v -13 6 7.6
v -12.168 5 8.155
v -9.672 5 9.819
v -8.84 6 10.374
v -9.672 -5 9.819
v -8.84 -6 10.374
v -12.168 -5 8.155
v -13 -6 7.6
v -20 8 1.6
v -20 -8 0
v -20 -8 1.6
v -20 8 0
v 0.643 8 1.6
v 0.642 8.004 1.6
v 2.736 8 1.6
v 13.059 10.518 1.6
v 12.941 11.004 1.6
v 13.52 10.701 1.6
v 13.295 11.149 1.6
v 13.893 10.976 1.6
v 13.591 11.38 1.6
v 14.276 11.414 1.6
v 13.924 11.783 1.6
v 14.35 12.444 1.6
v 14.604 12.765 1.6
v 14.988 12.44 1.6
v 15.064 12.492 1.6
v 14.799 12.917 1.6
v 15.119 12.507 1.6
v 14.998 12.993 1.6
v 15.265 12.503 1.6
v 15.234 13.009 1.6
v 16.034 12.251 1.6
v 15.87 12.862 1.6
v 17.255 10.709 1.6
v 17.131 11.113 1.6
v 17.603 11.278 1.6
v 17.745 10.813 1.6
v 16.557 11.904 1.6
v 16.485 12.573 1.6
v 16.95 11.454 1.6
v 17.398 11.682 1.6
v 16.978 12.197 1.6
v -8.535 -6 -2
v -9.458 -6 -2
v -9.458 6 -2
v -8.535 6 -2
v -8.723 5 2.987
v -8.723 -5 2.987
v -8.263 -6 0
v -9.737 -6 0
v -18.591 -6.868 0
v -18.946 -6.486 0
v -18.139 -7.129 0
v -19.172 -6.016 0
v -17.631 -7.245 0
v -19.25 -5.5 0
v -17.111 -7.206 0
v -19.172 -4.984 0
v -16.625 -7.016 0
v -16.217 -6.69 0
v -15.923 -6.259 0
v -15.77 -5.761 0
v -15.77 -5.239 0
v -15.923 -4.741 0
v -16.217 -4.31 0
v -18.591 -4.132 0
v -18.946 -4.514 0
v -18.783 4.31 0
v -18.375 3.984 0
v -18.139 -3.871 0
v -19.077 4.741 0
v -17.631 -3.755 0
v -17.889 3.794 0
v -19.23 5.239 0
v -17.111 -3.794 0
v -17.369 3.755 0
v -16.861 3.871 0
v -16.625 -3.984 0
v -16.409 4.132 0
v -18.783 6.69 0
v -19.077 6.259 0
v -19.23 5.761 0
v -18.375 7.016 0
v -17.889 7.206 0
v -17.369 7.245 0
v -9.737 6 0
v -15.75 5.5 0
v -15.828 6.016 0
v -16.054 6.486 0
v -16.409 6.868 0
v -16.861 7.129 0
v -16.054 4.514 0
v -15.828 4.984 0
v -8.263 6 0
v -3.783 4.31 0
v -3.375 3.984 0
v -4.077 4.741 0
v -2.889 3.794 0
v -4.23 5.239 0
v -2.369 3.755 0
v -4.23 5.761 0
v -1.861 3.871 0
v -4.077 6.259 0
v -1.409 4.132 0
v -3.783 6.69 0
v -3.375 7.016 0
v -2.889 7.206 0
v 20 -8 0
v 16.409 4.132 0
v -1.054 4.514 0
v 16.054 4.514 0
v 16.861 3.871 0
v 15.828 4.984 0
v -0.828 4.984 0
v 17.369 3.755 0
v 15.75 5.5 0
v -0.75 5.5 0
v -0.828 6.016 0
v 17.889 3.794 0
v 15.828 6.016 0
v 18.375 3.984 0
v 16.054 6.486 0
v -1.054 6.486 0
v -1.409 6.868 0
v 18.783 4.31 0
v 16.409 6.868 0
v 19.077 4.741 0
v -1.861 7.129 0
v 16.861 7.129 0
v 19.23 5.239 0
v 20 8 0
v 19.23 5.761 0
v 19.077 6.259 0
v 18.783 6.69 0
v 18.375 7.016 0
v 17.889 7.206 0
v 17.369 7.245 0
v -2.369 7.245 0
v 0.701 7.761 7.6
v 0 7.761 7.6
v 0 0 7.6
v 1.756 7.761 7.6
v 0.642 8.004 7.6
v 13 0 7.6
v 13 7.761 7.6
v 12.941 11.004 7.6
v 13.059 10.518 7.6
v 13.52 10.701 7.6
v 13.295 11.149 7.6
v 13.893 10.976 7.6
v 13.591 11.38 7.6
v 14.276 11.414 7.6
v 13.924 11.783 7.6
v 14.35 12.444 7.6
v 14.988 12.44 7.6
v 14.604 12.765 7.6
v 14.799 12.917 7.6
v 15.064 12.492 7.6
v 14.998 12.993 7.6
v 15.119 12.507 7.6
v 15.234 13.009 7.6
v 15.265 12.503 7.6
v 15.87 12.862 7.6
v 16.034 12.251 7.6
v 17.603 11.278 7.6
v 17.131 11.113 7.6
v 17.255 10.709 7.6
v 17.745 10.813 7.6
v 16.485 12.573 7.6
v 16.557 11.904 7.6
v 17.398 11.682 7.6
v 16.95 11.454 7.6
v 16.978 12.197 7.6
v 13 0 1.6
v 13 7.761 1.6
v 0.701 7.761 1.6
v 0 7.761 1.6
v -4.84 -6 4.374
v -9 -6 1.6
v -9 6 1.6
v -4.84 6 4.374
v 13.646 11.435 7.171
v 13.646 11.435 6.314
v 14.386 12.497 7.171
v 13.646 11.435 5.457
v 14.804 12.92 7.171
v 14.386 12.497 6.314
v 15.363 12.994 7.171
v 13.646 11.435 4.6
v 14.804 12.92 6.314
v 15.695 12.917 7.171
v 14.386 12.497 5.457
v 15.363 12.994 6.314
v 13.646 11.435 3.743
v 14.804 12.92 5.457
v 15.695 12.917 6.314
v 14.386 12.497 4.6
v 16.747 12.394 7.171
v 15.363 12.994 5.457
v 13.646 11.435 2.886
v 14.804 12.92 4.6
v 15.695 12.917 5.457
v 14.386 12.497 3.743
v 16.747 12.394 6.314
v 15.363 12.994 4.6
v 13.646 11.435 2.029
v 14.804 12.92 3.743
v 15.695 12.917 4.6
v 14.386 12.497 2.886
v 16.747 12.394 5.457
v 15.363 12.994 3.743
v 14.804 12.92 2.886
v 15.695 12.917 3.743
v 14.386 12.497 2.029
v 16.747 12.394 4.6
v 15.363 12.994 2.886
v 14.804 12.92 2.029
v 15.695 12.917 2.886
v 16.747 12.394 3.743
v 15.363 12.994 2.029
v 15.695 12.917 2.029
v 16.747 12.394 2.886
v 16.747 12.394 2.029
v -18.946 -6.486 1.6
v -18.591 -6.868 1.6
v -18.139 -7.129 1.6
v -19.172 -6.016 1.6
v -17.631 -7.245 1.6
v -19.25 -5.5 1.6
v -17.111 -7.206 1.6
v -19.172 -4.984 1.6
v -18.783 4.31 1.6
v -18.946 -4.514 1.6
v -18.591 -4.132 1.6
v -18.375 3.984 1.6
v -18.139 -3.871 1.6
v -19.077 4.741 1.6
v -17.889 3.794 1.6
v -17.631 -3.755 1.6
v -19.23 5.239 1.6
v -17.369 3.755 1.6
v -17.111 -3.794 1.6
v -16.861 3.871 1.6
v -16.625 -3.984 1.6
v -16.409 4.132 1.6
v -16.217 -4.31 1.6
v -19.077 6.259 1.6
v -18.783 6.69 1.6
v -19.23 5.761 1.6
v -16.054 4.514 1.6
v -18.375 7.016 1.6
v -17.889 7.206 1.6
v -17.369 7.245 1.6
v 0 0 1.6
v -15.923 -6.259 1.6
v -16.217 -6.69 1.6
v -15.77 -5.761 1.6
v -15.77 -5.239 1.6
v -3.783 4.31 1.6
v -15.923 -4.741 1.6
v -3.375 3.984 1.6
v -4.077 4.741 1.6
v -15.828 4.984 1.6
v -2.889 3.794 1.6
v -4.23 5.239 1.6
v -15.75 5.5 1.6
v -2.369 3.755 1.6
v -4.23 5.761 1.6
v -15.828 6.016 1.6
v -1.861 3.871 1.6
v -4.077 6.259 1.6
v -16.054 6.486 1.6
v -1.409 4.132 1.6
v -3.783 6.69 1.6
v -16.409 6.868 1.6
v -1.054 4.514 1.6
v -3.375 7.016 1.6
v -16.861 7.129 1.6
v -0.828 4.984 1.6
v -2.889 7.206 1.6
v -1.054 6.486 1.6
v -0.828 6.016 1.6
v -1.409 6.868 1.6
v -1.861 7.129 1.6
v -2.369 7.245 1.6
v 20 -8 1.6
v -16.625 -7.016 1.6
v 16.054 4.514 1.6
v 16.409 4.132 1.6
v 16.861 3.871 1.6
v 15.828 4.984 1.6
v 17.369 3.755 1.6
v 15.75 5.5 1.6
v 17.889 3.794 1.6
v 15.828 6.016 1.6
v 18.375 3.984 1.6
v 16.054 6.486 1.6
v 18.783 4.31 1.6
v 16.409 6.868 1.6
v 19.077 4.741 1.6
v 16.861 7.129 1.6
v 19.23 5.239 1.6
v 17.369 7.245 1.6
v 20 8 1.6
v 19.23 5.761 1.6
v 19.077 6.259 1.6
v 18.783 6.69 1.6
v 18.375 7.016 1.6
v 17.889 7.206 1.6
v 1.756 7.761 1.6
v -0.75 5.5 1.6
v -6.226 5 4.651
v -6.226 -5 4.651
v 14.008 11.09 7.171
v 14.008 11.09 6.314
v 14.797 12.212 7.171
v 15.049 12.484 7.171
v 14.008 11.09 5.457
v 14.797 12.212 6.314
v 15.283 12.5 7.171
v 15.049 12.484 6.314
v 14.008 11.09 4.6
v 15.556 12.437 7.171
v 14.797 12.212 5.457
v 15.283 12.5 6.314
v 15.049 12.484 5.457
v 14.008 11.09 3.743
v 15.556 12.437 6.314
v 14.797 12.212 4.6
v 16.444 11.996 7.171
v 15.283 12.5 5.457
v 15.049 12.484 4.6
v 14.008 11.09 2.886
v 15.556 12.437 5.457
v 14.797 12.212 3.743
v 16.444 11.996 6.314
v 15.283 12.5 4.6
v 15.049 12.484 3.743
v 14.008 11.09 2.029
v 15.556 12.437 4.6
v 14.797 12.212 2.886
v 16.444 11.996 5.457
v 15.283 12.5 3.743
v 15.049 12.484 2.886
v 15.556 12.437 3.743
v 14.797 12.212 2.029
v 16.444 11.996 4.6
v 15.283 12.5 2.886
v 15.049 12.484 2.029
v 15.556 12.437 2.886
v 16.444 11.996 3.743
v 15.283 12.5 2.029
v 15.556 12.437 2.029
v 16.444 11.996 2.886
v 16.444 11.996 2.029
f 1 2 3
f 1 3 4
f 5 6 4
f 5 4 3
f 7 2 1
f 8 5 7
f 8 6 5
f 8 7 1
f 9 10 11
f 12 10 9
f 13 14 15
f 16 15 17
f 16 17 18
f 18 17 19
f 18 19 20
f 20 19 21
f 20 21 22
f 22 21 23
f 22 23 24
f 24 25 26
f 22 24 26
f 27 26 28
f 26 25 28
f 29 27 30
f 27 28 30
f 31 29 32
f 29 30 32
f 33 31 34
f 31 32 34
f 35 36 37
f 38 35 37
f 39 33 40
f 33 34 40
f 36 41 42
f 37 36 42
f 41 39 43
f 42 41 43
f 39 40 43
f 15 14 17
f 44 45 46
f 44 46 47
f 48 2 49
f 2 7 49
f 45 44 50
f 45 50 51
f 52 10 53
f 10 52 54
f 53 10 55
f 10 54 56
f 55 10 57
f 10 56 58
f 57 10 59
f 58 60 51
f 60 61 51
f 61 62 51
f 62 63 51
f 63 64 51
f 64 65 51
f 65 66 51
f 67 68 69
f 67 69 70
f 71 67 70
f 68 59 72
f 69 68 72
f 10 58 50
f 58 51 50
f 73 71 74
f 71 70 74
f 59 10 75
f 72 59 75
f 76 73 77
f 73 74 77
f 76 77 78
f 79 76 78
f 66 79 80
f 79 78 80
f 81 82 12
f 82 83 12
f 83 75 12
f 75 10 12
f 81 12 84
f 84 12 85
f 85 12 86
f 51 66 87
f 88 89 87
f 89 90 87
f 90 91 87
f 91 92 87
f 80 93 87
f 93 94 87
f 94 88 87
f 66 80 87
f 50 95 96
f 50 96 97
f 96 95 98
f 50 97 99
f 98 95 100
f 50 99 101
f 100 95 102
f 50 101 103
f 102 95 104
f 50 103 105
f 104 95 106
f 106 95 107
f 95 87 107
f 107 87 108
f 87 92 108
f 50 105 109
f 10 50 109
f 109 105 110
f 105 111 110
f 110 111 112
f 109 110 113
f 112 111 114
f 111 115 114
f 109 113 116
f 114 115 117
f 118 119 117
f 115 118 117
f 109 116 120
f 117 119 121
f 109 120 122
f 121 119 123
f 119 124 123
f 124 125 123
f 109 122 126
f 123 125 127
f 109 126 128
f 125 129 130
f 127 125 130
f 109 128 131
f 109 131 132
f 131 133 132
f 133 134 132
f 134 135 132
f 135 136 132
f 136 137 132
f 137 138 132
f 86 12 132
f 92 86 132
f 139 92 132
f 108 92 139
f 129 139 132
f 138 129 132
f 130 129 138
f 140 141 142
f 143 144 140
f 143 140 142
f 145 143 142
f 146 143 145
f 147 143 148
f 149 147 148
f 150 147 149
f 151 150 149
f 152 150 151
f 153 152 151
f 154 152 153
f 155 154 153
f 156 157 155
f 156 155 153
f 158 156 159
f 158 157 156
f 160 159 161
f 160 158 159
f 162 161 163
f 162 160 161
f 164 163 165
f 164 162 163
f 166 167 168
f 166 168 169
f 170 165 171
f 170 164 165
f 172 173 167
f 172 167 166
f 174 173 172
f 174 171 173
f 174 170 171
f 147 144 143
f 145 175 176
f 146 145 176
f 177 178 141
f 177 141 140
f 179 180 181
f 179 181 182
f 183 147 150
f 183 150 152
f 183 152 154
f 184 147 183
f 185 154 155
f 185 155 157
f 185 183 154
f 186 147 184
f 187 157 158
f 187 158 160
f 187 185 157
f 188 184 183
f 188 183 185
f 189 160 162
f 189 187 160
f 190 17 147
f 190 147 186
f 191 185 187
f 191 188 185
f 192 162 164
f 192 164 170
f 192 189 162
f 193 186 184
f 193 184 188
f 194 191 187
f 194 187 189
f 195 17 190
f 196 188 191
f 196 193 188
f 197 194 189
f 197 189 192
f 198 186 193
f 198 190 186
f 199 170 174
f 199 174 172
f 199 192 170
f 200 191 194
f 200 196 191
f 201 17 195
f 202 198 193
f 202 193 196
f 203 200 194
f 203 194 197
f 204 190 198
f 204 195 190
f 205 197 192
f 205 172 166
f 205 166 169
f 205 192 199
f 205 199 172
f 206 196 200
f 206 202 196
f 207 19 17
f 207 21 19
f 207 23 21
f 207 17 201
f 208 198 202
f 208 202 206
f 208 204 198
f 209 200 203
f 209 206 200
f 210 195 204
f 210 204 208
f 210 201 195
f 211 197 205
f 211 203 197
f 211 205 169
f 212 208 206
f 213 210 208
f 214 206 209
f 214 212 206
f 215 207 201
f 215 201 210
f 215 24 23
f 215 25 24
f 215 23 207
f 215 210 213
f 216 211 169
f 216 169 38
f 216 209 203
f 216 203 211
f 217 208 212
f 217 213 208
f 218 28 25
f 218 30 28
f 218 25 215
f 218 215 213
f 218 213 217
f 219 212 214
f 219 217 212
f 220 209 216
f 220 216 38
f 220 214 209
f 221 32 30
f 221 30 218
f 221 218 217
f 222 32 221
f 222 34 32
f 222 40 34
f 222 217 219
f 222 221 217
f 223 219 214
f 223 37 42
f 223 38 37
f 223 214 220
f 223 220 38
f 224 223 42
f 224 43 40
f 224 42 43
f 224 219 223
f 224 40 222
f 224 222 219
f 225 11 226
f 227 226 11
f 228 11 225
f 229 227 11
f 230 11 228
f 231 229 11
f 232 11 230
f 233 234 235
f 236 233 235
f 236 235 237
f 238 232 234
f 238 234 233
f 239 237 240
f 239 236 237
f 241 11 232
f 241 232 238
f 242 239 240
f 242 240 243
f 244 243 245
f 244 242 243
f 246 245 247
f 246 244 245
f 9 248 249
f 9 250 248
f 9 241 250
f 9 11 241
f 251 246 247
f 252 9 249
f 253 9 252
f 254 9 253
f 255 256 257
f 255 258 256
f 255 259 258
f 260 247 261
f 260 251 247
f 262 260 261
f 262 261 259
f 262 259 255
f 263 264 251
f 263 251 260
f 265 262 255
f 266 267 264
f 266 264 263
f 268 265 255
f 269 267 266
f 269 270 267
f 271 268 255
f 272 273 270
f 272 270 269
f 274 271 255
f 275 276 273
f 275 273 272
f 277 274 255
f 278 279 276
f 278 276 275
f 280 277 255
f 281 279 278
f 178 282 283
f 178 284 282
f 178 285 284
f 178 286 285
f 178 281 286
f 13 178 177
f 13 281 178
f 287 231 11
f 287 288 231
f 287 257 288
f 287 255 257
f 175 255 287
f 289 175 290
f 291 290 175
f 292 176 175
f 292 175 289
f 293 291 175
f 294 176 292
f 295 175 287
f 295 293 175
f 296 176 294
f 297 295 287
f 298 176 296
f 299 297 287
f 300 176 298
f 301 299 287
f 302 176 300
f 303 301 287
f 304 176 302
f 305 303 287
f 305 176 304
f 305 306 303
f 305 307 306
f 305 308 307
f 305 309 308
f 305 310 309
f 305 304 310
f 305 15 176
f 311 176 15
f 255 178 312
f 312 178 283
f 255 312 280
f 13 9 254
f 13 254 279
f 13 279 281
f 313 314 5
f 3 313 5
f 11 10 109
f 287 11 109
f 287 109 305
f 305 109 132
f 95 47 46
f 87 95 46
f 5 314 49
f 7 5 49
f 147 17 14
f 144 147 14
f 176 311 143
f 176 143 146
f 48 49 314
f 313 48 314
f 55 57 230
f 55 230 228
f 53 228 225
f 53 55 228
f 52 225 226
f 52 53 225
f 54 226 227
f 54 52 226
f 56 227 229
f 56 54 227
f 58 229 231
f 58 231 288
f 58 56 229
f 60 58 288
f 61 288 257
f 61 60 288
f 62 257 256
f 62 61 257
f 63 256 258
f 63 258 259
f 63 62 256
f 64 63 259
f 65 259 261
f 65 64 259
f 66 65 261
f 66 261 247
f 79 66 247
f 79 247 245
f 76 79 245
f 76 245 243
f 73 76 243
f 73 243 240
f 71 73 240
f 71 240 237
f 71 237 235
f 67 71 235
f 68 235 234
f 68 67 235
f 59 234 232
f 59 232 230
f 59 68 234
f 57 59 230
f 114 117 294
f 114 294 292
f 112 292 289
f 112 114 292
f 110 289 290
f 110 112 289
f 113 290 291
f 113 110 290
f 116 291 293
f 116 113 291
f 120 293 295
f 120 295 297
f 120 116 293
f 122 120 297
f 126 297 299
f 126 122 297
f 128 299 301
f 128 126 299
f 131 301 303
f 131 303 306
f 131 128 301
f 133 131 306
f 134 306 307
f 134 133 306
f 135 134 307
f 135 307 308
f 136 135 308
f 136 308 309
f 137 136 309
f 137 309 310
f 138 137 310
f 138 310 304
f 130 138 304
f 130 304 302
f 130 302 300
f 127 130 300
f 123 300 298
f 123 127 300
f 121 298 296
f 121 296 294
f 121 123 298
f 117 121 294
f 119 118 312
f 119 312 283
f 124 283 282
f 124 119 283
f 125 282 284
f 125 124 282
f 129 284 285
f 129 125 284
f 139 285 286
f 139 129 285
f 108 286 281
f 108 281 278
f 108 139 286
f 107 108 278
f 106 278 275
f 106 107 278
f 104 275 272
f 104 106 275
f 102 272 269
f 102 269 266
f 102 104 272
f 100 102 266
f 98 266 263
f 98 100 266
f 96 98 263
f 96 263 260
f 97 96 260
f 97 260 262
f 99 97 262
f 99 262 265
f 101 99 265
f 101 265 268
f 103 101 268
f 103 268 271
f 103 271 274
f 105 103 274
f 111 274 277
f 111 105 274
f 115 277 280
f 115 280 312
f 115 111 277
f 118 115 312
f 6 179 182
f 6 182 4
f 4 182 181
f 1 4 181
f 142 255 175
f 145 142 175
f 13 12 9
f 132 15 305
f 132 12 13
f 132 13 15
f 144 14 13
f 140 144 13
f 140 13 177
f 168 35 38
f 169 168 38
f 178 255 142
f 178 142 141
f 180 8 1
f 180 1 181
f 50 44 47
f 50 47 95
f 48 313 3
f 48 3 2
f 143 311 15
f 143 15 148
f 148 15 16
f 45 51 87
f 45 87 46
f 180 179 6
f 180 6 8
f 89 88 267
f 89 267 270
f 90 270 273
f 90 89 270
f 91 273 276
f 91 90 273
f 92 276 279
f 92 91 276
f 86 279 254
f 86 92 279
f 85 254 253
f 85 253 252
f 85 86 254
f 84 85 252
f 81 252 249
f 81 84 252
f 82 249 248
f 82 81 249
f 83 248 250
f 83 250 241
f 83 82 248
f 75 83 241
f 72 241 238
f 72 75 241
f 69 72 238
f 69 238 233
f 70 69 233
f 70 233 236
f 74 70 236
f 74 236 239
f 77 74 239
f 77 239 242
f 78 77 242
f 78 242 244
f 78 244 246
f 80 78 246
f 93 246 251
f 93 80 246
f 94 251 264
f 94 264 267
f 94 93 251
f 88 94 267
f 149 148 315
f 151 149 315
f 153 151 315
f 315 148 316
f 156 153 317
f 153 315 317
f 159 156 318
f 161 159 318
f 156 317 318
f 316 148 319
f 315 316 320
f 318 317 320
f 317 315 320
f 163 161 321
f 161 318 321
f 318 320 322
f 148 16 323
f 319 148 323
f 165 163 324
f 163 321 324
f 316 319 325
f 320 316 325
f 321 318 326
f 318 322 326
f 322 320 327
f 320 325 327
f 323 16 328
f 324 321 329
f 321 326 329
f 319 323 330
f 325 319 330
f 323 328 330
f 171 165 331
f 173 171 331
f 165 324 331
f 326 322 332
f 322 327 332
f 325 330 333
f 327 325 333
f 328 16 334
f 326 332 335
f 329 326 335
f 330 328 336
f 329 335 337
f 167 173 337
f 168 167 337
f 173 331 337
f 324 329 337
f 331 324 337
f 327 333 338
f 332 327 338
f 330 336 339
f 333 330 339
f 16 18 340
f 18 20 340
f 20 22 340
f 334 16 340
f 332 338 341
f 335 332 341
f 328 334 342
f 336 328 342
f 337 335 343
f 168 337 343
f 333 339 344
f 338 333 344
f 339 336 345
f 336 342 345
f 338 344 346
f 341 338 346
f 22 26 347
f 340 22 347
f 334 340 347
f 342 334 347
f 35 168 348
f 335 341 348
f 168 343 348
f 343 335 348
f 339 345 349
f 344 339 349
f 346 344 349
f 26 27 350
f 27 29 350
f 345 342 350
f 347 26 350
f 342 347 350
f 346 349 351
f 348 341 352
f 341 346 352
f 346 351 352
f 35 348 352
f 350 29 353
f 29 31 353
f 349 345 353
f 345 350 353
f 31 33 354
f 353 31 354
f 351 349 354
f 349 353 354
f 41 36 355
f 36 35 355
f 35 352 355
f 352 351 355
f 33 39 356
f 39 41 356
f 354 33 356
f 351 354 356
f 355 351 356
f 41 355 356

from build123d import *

# Parameters (mm, degrees)
SKETCH1_W           = 40
SKETCH1_H           = 16
SKETCH1_R           = 1.75
EXTRUDE1_DEPTH      = 1.6
SKETCH2_W           = 13
SKETCH2_H           = 7.760900167
EXTRUDE2_DEPTH      = 6
EXTRUDE_THIN1_START = -6
EXTRUDE_THIN1_DEPTH = 6
EXTRUDE3_DEPTH      = 6
EXTRUDE3_DEPTH_BACK = 6
SHELL1_T            = -1
EXTRUDE4_DEPTH      = 6
EXTRUDE4_DEPTH_BACK = 6


# Read off the part's stored shape, not the designer's step: Extrude-Thin1
with BuildPart() as part:
    # Sketch1 → Extrude1 (new body)
    with BuildSketch(Plane.XY):
        Rectangle(SKETCH1_W, SKETCH1_H)
        with Locations((-17.5, 5.5)):
            Circle(SKETCH1_R, mode=Mode.SUBTRACT)
        with Locations(Location((17.5, 5.5, 0), (0, 0, 180))):
            Circle(SKETCH1_R, mode=Mode.SUBTRACT)
        with Locations(Location((-17.5, -5.5, 0), (0, 0, 180))):
            Circle(SKETCH1_R, mode=Mode.SUBTRACT)
        with Locations((-2.5, 5.5)):
            Circle(SKETCH1_R, mode=Mode.SUBTRACT)
    extrude(amount=EXTRUDE1_DEPTH)

    # Sketch2 → Extrude2 (add)
    with BuildSketch(Plane.XY.offset(1.6)):
        with Locations((6.5, 3.880450084)):
            Rectangle(SKETCH2_W, SKETCH2_H)
    extrude(amount=EXTRUDE2_DEPTH)

    # Extrude-Thin1 outline → Extrude-Thin1 (add)
    with BuildSketch(Plane.XY.offset(7.6).offset(EXTRUDE_THIN1_START)):
        with BuildLine():
            Line((1.75628065, 7.760900167), (13.059245146, 10.51802157))
            add(Edge.make_bspline(
                [(13.059245146, 10.51802157), (13.258392783, 10.566599464), (13.436578776, 10.646382088), (13.751079076, 10.845085733), (13.887567817, 10.963617525), (14.248802057, 11.343386603), (14.427398427, 11.628835129), (14.659201777, 12.00094611), (14.730292096, 12.115741352), (14.863522365, 12.307378975), (14.926209875, 12.383669897), (15.005501687, 12.455780424), (15.029150989, 12.472768865), (15.068625166, 12.494907839), (15.08339758, 12.500317873), (15.14331693, 12.513390547), (15.202781043, 12.513126448), (15.322823552, 12.493735016), (15.368276479, 12.484388221), (15.460759179, 12.463022362), (15.50815066, 12.450773554), (15.652759011, 12.409108117), (15.752400152, 12.374767578), (16.053339356, 12.250496873), (16.25646151, 12.139308703), (16.630808407, 11.853191446), (16.802050862, 11.678608174), (17.082562235, 11.255189844), (17.192418017, 11.006263961), (17.255436889, 10.709045709)],
                knots=[0, 0, 0, 0, 0.0625, 0.0625, 0.125, 0.125, 0.25, 0.25, 0.3125, 0.3125, 0.375, 0.375, 0.40625, 0.40625, 0.4375, 0.4375, 0.5, 0.5, 0.53125, 0.53125, 0.5625, 0.5625, 0.625, 0.625, 0.75, 0.75, 0.875, 0.875, 1, 1, 1, 1], degree=3))
            Line((17.255436889, 10.709045709), (17.744563111, 10.812754625))
            add(Edge.make_bspline(
                [(12.940754854, 11.003778764), (13.084783094, 11.038911435), (13.210931122, 11.095251055), (13.442595629, 11.241618426), (13.547937674, 11.332035405), (13.841211649, 11.640357194), (14.004308568, 11.895295314), (14.234159709, 12.264272438), (14.308473314, 12.384924588), (14.464269553, 12.609020967), (14.545204627, 12.713016654), (14.691396043, 12.845967835), (14.74458271, 12.886438595), (14.86402781, 12.953429018), (14.931498353, 12.978939177), (15.127379677, 13.021674833), (15.250100345, 13.011964204), (15.418766988, 12.984718125), (15.472161624, 12.973557856), (15.58197057, 12.948189193), (15.637961747, 12.933712021), (15.808431424, 12.884595261), (15.925415704, 12.844275322), (16.279829349, 12.697922726), (16.520911208, 12.566506205), (16.973610567, 12.22050334), (17.185210355, 12.005571181), (17.533055699, 11.480515482), (17.668714391, 11.170482767), (17.744563111, 10.812754625)],
                knots=[0, 0, 0, 0, 0.0625, 0.0625, 0.125, 0.125, 0.25, 0.25, 0.3125, 0.3125, 0.375, 0.375, 0.40625, 0.40625, 0.4375, 0.4375, 0.5, 0.5, 0.53125, 0.53125, 0.5625, 0.5625, 0.625, 0.625, 0.75, 0.75, 0.875, 0.875, 1, 1, 1, 1], degree=3))
            Line((12.940754854, 11.003778764), (0.642096752, 8.003778764))
            Line((0.642096752, 8.003778764), (0.701341897, 7.760900167))
            Line((0.701341897, 7.760900167), (1.75628065, 7.760900167))
        make_face()
    extrude(amount=EXTRUDE_THIN1_DEPTH)

    # Sketch5 → Extrude4 (add, two sides: drawn at the far end of the back side and taken through both)
    with BuildSketch(Plane(origin=(0, 0, 0), x_dir=(1, 0, 0), z_dir=(0, 1, 0)).offset(-EXTRUDE4_DEPTH_BACK)):
        Polygon((-9.736964899, 0), (-9.458111879, 2), (-8.535084126, 2), (-8.263035101, 0), align=None)
    extrude(amount=EXTRUDE4_DEPTH + EXTRUDE4_DEPTH_BACK)


with BuildPart() as body_2:
    # Sketch4 → Extrude3 (new, two sides: drawn at the far end of the back side and taken through both)
    with BuildSketch(Plane(origin=(0, 0, 0), x_dir=(1, 0, 0), z_dir=(0, 1, 0)).offset(-EXTRUDE3_DEPTH_BACK)):
        Polygon((-13, -7.6), (-9, -1.6), (-4.839748528, -4.373500981), (-8.839748528, -10.373500981), align=None)
    extrude(amount=EXTRUDE3_DEPTH + EXTRUDE3_DEPTH_BACK)

    # Shell1
    shell1_openings = [body_2.faces().sort_by_distance(p)[0] for p in [
        (-10.919874264, 0, 8.986750491),
    ]]
    offset(amount=SHELL1_T, openings=shell1_openings, kind=Kind.INTERSECTION)


solid = Compound([part.part, body_2.part])
